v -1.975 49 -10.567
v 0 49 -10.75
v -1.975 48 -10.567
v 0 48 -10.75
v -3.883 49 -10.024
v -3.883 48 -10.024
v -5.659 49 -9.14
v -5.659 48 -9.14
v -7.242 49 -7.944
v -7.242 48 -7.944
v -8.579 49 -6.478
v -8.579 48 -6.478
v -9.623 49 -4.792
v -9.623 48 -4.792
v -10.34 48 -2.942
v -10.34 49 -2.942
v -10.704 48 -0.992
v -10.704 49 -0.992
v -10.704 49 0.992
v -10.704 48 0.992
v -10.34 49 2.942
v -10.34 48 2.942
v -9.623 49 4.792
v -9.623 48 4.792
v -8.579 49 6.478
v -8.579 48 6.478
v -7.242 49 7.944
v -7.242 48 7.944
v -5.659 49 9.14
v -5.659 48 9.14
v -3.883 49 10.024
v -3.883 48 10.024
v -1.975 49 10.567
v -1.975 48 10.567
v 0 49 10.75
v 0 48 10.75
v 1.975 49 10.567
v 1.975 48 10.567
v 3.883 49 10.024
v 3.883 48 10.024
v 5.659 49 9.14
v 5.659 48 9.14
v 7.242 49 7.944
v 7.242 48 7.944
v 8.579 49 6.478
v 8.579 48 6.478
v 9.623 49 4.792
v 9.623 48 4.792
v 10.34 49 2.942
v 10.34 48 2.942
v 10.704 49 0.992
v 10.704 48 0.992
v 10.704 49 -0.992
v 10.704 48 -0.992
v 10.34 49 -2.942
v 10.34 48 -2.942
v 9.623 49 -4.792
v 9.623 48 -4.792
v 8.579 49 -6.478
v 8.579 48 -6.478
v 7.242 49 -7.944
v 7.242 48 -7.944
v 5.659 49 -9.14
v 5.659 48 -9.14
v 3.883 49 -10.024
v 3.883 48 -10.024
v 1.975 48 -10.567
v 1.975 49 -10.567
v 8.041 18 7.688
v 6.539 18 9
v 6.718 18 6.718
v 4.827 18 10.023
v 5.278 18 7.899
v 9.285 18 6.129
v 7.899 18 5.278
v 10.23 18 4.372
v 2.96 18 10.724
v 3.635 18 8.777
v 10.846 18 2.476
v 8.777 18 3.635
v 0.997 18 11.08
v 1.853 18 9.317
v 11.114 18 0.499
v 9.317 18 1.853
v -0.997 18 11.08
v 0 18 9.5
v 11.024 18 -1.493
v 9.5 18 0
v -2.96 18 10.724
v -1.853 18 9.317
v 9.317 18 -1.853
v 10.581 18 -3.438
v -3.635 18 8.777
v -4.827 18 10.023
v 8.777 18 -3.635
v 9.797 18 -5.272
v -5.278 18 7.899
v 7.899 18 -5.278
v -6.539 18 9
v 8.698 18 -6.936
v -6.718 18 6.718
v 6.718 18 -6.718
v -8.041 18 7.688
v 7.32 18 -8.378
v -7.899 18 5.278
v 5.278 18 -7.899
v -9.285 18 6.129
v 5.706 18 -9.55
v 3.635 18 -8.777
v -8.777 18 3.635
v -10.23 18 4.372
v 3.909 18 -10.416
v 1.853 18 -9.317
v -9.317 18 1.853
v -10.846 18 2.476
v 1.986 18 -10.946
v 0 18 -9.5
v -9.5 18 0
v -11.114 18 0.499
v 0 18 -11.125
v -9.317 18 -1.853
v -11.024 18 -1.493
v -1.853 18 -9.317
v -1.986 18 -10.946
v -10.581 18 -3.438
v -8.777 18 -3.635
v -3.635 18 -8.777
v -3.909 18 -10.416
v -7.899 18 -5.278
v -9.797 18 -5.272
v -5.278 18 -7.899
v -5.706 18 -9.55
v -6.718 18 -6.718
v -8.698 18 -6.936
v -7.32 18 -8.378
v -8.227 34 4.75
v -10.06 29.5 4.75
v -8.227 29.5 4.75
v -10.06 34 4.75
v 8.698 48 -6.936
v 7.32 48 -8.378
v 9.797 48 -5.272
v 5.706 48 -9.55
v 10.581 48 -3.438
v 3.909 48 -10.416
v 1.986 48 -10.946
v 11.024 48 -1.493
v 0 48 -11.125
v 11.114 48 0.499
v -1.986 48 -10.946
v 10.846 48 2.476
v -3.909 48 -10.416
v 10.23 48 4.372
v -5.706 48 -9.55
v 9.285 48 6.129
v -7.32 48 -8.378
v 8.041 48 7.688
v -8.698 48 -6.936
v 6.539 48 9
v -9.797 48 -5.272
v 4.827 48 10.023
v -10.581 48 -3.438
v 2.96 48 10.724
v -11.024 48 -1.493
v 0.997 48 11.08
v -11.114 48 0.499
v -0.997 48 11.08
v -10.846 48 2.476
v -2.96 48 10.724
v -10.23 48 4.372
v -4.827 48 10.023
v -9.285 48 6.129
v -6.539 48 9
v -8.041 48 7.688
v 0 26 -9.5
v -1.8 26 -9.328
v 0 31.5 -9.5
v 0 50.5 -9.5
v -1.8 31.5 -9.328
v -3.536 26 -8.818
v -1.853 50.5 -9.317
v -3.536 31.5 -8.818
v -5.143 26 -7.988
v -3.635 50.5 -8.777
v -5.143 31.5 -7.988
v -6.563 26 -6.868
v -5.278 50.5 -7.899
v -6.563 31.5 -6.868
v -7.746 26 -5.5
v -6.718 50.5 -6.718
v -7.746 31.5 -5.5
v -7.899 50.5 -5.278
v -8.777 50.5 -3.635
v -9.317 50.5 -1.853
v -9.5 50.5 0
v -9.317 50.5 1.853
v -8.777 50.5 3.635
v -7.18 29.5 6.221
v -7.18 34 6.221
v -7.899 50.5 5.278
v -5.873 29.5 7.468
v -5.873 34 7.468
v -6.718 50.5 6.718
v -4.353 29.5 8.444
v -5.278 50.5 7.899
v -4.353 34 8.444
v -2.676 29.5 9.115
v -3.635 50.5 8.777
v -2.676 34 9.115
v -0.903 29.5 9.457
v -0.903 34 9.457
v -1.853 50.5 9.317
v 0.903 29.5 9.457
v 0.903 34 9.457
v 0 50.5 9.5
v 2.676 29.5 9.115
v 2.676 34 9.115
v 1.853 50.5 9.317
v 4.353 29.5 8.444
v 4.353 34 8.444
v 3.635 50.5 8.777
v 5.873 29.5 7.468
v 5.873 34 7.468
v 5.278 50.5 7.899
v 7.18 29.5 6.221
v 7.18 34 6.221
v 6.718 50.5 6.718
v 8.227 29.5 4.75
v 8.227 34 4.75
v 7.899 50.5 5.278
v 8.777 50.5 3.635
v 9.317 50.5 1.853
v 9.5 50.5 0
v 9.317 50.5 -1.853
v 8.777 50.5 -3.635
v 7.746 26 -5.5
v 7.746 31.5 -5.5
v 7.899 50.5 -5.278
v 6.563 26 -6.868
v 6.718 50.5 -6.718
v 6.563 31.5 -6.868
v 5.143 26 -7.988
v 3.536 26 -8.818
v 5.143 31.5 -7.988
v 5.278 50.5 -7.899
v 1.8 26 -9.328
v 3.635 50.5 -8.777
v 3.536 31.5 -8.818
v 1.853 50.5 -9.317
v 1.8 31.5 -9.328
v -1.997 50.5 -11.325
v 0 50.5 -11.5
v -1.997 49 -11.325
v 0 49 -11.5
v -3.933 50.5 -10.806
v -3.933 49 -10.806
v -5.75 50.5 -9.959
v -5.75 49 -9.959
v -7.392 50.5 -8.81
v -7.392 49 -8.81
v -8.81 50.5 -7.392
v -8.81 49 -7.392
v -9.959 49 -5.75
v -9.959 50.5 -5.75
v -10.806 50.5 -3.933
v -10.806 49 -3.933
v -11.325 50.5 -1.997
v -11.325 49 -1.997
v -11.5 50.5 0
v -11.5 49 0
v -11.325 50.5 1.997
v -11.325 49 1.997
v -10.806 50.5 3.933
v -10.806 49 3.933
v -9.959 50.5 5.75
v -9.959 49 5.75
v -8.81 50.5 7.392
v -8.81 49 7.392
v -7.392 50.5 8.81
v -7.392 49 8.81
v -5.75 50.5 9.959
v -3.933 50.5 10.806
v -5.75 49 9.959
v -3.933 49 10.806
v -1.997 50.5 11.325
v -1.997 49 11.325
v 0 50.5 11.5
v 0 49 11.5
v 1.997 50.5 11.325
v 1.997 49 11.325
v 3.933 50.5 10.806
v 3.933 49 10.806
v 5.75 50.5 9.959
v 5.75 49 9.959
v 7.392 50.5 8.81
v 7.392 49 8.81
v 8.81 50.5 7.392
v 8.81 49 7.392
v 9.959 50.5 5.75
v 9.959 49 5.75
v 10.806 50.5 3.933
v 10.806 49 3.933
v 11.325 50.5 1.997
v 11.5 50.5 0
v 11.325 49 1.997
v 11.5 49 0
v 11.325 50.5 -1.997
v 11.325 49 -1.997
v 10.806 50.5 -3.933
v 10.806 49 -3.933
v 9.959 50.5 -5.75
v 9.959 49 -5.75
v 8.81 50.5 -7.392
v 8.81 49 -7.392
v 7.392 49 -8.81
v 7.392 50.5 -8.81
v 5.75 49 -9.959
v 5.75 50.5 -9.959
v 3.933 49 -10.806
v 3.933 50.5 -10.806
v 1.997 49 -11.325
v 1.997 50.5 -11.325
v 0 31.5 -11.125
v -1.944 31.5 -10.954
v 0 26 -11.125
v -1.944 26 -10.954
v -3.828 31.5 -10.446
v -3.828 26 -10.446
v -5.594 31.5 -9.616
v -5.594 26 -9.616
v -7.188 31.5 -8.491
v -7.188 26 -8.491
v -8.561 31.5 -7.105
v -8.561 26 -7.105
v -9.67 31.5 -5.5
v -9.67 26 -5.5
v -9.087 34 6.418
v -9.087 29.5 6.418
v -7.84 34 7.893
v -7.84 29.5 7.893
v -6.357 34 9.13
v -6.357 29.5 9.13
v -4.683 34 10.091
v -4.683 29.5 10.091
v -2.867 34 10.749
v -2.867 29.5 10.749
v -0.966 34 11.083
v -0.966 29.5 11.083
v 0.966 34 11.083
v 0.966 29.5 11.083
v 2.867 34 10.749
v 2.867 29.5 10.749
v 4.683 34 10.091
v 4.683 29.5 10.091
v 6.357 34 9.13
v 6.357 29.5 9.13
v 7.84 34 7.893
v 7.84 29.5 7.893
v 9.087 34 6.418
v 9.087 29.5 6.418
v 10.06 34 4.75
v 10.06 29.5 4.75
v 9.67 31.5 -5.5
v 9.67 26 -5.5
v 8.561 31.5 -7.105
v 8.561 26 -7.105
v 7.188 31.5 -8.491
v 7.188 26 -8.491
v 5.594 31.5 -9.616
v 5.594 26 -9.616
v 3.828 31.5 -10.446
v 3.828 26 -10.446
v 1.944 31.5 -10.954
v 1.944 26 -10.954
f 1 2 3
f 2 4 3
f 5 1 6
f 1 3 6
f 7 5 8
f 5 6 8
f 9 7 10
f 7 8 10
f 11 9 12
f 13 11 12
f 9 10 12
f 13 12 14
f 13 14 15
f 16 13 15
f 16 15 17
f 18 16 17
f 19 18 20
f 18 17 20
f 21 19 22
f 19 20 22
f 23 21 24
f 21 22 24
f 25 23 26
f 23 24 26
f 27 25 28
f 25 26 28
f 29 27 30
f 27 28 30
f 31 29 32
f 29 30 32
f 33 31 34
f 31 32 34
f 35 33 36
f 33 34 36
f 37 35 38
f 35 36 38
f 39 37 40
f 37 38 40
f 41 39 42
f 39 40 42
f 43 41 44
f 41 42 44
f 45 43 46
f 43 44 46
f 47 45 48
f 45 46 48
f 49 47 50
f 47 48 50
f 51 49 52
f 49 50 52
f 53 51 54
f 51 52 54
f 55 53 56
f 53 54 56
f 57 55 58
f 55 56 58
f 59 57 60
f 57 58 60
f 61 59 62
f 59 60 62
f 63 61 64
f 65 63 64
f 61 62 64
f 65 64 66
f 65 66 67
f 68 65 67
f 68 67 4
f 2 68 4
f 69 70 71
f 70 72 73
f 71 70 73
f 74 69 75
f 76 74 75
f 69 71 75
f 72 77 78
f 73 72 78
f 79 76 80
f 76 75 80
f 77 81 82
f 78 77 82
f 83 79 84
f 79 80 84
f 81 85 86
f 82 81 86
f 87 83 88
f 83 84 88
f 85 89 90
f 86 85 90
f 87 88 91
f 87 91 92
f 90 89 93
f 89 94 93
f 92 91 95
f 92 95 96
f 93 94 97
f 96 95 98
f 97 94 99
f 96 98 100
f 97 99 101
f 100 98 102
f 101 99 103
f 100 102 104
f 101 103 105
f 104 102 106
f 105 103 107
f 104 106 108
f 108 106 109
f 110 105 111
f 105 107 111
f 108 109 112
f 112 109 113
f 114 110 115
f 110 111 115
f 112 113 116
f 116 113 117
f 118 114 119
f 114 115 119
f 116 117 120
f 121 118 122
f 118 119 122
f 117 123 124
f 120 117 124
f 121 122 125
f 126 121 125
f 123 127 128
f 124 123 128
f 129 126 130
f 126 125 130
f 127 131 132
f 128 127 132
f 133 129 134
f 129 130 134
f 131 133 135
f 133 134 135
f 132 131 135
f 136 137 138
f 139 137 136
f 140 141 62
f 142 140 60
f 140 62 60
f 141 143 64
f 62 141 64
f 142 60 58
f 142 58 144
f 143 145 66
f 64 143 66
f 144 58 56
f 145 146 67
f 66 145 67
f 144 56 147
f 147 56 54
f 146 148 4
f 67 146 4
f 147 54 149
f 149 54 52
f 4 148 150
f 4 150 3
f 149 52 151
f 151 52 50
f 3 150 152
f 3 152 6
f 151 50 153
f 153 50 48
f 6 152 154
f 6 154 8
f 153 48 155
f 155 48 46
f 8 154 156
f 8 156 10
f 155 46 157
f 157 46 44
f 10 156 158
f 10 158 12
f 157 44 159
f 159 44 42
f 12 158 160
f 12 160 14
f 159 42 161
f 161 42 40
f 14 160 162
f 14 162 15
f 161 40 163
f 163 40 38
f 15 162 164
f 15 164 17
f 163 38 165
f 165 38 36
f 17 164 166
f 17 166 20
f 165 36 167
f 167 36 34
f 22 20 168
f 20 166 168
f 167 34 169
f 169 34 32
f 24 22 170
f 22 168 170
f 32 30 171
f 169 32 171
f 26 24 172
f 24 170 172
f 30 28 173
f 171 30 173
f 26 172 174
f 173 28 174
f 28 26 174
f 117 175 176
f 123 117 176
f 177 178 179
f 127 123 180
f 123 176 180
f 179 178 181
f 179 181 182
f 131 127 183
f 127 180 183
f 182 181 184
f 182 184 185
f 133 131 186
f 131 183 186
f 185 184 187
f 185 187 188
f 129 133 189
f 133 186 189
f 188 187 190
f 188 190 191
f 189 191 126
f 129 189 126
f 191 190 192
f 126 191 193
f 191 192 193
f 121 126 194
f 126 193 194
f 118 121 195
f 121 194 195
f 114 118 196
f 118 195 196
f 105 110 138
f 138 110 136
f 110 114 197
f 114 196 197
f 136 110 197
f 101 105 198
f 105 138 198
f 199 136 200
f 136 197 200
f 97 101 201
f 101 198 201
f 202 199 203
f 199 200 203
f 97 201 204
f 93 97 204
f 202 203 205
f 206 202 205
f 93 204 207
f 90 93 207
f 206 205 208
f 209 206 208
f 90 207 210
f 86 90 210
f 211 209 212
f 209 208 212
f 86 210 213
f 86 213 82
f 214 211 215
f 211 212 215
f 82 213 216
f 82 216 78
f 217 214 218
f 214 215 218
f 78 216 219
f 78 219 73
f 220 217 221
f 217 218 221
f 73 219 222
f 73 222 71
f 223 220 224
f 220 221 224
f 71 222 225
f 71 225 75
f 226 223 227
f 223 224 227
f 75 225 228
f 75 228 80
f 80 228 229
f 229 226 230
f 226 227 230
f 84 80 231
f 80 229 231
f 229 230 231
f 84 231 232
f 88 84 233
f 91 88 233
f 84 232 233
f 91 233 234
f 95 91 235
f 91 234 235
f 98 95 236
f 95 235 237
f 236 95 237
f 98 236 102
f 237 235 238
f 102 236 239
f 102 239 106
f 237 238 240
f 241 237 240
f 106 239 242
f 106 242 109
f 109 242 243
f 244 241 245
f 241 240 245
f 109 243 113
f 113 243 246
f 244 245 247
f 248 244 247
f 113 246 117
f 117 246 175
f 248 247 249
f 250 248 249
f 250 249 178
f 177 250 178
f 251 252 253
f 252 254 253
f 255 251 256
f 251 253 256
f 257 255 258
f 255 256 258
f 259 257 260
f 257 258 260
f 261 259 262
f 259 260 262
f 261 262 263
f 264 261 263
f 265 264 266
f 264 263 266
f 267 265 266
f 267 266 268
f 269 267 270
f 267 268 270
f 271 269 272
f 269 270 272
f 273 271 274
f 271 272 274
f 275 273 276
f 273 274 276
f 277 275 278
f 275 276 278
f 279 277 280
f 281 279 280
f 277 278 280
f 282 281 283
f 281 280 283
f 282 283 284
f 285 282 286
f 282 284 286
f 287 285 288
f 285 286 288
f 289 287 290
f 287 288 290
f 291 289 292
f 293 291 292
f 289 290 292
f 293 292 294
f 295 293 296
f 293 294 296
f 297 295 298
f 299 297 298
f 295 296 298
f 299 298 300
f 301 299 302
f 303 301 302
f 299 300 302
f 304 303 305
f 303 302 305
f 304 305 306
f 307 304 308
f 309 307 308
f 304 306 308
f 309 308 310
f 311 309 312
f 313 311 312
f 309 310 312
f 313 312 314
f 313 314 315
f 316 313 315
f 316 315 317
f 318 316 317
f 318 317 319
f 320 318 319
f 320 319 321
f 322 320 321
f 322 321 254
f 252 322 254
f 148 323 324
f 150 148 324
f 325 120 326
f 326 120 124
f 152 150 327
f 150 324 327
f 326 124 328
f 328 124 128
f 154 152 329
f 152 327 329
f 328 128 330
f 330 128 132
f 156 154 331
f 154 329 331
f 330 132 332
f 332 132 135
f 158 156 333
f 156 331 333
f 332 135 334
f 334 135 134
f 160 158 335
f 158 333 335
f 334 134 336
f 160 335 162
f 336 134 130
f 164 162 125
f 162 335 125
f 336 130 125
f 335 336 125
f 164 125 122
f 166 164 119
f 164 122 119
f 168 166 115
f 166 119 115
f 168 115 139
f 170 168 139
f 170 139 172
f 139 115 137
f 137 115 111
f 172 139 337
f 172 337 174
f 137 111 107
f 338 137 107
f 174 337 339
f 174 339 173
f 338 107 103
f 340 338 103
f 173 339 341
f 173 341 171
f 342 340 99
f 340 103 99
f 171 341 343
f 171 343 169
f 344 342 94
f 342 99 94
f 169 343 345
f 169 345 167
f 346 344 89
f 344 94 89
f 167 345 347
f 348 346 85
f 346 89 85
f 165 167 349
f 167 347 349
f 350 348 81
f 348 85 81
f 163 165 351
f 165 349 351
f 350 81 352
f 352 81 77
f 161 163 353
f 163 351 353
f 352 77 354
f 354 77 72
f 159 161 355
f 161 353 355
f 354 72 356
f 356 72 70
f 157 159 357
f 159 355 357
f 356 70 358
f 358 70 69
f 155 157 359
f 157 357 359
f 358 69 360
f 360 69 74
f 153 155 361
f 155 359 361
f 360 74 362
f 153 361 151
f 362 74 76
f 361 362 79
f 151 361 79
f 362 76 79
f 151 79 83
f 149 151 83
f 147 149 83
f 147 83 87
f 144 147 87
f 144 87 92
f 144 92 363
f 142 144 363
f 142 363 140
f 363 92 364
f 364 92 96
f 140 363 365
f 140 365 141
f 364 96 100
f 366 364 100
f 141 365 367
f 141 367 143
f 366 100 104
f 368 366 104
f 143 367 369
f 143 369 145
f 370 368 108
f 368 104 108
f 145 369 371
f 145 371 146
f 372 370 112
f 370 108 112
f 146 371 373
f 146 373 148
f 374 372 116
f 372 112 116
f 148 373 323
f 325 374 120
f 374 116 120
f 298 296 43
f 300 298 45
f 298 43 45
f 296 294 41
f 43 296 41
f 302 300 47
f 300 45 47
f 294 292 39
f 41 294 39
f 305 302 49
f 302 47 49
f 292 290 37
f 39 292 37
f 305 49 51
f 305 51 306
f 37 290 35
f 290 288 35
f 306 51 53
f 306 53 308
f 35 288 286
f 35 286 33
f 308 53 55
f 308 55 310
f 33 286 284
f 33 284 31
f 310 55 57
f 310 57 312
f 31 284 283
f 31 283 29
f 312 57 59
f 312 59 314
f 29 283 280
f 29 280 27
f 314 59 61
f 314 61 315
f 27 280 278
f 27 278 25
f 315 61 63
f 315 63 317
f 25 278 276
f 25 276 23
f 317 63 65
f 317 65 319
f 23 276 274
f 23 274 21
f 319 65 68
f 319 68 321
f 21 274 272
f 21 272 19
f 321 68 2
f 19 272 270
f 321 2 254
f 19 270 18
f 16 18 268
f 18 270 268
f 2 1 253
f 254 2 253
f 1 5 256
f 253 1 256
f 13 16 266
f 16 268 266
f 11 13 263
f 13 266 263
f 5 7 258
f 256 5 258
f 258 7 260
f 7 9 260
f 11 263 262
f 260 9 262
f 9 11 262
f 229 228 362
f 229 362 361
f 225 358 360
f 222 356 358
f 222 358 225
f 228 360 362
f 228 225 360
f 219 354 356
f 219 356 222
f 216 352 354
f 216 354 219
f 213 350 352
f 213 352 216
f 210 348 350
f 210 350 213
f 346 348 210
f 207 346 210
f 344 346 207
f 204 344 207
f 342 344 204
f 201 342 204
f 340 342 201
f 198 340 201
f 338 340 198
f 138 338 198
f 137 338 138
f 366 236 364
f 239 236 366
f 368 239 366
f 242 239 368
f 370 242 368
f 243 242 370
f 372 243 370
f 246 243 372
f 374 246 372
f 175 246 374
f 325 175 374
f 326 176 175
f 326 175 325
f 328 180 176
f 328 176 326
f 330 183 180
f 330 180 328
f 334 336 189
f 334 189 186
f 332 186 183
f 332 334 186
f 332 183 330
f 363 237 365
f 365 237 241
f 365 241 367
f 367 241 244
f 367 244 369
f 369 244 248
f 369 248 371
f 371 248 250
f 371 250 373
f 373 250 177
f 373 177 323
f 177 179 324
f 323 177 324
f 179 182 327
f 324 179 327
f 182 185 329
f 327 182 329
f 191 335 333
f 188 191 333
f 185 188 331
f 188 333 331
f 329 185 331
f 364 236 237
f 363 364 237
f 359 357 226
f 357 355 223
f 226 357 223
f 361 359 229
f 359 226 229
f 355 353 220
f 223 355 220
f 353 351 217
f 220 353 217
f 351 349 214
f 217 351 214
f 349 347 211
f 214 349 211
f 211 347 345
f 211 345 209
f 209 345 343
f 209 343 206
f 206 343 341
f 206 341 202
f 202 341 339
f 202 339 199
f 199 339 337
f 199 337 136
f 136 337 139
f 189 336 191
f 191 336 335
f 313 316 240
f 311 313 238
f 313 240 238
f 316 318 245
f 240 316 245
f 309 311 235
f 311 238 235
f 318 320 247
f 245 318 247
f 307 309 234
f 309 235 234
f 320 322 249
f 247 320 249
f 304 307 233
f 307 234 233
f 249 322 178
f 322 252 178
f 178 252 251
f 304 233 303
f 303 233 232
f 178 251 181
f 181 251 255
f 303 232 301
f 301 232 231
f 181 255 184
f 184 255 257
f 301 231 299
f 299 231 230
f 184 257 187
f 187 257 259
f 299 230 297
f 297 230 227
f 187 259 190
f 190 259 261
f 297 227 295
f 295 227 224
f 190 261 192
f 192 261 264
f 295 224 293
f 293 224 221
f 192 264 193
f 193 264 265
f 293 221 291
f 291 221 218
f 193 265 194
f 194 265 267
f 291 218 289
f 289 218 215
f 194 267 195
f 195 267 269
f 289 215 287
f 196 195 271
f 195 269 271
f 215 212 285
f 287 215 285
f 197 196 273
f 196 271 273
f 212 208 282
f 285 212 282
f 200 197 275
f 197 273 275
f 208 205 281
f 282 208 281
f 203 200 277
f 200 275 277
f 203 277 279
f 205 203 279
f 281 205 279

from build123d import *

# Parameters (mm, degrees)
ENL_V_MAT_EXTRU_2_DEPTH      = 54.054217551
ENL_V_MAT_EXTRU_2_DEPTH_BACK = 54.054217551
ESQUISSE3_W                  = 6.375
ESQUISSE3_H                  = 4.5
ESQUISSE3_W_2                = 5.625
ESQUISSE3_H_2                = 5.5


with BuildPart() as part:
    # Esquisse1 → Base-Révolution (revolve)
    with BuildSketch(Plane.XY):
        Polygon((10.75, 49), (10.75, 48), (11.125, 48), (11.125, 18), (9.5, 18), (9.5, 50.5), (11.5, 50.5), (11.5, 49), align=None)
    revolve(axis=Axis((0, 0, 0), (0, 1, 0)))

    # Esquisse3 → Enlèv. mat.-Extru.2 (cut, two sides: drawn at the far end of the back side and taken through both)
    with BuildSketch(Plane(origin=(0, 0, 0), x_dir=(0, 0, -1), z_dir=(1, 0, 0)).offset(-ENL_V_MAT_EXTRU_2_DEPTH_BACK)):
        with Locations((-7.9375, 31.75)):
            Rectangle(ESQUISSE3_W, ESQUISSE3_H)
        with Locations((8.3125, 28.75)):
            Rectangle(ESQUISSE3_W_2, ESQUISSE3_H_2)
    extrude(amount=ENL_V_MAT_EXTRU_2_DEPTH + ENL_V_MAT_EXTRU_2_DEPTH_BACK, mode=Mode.SUBTRACT)


solid = part.part
